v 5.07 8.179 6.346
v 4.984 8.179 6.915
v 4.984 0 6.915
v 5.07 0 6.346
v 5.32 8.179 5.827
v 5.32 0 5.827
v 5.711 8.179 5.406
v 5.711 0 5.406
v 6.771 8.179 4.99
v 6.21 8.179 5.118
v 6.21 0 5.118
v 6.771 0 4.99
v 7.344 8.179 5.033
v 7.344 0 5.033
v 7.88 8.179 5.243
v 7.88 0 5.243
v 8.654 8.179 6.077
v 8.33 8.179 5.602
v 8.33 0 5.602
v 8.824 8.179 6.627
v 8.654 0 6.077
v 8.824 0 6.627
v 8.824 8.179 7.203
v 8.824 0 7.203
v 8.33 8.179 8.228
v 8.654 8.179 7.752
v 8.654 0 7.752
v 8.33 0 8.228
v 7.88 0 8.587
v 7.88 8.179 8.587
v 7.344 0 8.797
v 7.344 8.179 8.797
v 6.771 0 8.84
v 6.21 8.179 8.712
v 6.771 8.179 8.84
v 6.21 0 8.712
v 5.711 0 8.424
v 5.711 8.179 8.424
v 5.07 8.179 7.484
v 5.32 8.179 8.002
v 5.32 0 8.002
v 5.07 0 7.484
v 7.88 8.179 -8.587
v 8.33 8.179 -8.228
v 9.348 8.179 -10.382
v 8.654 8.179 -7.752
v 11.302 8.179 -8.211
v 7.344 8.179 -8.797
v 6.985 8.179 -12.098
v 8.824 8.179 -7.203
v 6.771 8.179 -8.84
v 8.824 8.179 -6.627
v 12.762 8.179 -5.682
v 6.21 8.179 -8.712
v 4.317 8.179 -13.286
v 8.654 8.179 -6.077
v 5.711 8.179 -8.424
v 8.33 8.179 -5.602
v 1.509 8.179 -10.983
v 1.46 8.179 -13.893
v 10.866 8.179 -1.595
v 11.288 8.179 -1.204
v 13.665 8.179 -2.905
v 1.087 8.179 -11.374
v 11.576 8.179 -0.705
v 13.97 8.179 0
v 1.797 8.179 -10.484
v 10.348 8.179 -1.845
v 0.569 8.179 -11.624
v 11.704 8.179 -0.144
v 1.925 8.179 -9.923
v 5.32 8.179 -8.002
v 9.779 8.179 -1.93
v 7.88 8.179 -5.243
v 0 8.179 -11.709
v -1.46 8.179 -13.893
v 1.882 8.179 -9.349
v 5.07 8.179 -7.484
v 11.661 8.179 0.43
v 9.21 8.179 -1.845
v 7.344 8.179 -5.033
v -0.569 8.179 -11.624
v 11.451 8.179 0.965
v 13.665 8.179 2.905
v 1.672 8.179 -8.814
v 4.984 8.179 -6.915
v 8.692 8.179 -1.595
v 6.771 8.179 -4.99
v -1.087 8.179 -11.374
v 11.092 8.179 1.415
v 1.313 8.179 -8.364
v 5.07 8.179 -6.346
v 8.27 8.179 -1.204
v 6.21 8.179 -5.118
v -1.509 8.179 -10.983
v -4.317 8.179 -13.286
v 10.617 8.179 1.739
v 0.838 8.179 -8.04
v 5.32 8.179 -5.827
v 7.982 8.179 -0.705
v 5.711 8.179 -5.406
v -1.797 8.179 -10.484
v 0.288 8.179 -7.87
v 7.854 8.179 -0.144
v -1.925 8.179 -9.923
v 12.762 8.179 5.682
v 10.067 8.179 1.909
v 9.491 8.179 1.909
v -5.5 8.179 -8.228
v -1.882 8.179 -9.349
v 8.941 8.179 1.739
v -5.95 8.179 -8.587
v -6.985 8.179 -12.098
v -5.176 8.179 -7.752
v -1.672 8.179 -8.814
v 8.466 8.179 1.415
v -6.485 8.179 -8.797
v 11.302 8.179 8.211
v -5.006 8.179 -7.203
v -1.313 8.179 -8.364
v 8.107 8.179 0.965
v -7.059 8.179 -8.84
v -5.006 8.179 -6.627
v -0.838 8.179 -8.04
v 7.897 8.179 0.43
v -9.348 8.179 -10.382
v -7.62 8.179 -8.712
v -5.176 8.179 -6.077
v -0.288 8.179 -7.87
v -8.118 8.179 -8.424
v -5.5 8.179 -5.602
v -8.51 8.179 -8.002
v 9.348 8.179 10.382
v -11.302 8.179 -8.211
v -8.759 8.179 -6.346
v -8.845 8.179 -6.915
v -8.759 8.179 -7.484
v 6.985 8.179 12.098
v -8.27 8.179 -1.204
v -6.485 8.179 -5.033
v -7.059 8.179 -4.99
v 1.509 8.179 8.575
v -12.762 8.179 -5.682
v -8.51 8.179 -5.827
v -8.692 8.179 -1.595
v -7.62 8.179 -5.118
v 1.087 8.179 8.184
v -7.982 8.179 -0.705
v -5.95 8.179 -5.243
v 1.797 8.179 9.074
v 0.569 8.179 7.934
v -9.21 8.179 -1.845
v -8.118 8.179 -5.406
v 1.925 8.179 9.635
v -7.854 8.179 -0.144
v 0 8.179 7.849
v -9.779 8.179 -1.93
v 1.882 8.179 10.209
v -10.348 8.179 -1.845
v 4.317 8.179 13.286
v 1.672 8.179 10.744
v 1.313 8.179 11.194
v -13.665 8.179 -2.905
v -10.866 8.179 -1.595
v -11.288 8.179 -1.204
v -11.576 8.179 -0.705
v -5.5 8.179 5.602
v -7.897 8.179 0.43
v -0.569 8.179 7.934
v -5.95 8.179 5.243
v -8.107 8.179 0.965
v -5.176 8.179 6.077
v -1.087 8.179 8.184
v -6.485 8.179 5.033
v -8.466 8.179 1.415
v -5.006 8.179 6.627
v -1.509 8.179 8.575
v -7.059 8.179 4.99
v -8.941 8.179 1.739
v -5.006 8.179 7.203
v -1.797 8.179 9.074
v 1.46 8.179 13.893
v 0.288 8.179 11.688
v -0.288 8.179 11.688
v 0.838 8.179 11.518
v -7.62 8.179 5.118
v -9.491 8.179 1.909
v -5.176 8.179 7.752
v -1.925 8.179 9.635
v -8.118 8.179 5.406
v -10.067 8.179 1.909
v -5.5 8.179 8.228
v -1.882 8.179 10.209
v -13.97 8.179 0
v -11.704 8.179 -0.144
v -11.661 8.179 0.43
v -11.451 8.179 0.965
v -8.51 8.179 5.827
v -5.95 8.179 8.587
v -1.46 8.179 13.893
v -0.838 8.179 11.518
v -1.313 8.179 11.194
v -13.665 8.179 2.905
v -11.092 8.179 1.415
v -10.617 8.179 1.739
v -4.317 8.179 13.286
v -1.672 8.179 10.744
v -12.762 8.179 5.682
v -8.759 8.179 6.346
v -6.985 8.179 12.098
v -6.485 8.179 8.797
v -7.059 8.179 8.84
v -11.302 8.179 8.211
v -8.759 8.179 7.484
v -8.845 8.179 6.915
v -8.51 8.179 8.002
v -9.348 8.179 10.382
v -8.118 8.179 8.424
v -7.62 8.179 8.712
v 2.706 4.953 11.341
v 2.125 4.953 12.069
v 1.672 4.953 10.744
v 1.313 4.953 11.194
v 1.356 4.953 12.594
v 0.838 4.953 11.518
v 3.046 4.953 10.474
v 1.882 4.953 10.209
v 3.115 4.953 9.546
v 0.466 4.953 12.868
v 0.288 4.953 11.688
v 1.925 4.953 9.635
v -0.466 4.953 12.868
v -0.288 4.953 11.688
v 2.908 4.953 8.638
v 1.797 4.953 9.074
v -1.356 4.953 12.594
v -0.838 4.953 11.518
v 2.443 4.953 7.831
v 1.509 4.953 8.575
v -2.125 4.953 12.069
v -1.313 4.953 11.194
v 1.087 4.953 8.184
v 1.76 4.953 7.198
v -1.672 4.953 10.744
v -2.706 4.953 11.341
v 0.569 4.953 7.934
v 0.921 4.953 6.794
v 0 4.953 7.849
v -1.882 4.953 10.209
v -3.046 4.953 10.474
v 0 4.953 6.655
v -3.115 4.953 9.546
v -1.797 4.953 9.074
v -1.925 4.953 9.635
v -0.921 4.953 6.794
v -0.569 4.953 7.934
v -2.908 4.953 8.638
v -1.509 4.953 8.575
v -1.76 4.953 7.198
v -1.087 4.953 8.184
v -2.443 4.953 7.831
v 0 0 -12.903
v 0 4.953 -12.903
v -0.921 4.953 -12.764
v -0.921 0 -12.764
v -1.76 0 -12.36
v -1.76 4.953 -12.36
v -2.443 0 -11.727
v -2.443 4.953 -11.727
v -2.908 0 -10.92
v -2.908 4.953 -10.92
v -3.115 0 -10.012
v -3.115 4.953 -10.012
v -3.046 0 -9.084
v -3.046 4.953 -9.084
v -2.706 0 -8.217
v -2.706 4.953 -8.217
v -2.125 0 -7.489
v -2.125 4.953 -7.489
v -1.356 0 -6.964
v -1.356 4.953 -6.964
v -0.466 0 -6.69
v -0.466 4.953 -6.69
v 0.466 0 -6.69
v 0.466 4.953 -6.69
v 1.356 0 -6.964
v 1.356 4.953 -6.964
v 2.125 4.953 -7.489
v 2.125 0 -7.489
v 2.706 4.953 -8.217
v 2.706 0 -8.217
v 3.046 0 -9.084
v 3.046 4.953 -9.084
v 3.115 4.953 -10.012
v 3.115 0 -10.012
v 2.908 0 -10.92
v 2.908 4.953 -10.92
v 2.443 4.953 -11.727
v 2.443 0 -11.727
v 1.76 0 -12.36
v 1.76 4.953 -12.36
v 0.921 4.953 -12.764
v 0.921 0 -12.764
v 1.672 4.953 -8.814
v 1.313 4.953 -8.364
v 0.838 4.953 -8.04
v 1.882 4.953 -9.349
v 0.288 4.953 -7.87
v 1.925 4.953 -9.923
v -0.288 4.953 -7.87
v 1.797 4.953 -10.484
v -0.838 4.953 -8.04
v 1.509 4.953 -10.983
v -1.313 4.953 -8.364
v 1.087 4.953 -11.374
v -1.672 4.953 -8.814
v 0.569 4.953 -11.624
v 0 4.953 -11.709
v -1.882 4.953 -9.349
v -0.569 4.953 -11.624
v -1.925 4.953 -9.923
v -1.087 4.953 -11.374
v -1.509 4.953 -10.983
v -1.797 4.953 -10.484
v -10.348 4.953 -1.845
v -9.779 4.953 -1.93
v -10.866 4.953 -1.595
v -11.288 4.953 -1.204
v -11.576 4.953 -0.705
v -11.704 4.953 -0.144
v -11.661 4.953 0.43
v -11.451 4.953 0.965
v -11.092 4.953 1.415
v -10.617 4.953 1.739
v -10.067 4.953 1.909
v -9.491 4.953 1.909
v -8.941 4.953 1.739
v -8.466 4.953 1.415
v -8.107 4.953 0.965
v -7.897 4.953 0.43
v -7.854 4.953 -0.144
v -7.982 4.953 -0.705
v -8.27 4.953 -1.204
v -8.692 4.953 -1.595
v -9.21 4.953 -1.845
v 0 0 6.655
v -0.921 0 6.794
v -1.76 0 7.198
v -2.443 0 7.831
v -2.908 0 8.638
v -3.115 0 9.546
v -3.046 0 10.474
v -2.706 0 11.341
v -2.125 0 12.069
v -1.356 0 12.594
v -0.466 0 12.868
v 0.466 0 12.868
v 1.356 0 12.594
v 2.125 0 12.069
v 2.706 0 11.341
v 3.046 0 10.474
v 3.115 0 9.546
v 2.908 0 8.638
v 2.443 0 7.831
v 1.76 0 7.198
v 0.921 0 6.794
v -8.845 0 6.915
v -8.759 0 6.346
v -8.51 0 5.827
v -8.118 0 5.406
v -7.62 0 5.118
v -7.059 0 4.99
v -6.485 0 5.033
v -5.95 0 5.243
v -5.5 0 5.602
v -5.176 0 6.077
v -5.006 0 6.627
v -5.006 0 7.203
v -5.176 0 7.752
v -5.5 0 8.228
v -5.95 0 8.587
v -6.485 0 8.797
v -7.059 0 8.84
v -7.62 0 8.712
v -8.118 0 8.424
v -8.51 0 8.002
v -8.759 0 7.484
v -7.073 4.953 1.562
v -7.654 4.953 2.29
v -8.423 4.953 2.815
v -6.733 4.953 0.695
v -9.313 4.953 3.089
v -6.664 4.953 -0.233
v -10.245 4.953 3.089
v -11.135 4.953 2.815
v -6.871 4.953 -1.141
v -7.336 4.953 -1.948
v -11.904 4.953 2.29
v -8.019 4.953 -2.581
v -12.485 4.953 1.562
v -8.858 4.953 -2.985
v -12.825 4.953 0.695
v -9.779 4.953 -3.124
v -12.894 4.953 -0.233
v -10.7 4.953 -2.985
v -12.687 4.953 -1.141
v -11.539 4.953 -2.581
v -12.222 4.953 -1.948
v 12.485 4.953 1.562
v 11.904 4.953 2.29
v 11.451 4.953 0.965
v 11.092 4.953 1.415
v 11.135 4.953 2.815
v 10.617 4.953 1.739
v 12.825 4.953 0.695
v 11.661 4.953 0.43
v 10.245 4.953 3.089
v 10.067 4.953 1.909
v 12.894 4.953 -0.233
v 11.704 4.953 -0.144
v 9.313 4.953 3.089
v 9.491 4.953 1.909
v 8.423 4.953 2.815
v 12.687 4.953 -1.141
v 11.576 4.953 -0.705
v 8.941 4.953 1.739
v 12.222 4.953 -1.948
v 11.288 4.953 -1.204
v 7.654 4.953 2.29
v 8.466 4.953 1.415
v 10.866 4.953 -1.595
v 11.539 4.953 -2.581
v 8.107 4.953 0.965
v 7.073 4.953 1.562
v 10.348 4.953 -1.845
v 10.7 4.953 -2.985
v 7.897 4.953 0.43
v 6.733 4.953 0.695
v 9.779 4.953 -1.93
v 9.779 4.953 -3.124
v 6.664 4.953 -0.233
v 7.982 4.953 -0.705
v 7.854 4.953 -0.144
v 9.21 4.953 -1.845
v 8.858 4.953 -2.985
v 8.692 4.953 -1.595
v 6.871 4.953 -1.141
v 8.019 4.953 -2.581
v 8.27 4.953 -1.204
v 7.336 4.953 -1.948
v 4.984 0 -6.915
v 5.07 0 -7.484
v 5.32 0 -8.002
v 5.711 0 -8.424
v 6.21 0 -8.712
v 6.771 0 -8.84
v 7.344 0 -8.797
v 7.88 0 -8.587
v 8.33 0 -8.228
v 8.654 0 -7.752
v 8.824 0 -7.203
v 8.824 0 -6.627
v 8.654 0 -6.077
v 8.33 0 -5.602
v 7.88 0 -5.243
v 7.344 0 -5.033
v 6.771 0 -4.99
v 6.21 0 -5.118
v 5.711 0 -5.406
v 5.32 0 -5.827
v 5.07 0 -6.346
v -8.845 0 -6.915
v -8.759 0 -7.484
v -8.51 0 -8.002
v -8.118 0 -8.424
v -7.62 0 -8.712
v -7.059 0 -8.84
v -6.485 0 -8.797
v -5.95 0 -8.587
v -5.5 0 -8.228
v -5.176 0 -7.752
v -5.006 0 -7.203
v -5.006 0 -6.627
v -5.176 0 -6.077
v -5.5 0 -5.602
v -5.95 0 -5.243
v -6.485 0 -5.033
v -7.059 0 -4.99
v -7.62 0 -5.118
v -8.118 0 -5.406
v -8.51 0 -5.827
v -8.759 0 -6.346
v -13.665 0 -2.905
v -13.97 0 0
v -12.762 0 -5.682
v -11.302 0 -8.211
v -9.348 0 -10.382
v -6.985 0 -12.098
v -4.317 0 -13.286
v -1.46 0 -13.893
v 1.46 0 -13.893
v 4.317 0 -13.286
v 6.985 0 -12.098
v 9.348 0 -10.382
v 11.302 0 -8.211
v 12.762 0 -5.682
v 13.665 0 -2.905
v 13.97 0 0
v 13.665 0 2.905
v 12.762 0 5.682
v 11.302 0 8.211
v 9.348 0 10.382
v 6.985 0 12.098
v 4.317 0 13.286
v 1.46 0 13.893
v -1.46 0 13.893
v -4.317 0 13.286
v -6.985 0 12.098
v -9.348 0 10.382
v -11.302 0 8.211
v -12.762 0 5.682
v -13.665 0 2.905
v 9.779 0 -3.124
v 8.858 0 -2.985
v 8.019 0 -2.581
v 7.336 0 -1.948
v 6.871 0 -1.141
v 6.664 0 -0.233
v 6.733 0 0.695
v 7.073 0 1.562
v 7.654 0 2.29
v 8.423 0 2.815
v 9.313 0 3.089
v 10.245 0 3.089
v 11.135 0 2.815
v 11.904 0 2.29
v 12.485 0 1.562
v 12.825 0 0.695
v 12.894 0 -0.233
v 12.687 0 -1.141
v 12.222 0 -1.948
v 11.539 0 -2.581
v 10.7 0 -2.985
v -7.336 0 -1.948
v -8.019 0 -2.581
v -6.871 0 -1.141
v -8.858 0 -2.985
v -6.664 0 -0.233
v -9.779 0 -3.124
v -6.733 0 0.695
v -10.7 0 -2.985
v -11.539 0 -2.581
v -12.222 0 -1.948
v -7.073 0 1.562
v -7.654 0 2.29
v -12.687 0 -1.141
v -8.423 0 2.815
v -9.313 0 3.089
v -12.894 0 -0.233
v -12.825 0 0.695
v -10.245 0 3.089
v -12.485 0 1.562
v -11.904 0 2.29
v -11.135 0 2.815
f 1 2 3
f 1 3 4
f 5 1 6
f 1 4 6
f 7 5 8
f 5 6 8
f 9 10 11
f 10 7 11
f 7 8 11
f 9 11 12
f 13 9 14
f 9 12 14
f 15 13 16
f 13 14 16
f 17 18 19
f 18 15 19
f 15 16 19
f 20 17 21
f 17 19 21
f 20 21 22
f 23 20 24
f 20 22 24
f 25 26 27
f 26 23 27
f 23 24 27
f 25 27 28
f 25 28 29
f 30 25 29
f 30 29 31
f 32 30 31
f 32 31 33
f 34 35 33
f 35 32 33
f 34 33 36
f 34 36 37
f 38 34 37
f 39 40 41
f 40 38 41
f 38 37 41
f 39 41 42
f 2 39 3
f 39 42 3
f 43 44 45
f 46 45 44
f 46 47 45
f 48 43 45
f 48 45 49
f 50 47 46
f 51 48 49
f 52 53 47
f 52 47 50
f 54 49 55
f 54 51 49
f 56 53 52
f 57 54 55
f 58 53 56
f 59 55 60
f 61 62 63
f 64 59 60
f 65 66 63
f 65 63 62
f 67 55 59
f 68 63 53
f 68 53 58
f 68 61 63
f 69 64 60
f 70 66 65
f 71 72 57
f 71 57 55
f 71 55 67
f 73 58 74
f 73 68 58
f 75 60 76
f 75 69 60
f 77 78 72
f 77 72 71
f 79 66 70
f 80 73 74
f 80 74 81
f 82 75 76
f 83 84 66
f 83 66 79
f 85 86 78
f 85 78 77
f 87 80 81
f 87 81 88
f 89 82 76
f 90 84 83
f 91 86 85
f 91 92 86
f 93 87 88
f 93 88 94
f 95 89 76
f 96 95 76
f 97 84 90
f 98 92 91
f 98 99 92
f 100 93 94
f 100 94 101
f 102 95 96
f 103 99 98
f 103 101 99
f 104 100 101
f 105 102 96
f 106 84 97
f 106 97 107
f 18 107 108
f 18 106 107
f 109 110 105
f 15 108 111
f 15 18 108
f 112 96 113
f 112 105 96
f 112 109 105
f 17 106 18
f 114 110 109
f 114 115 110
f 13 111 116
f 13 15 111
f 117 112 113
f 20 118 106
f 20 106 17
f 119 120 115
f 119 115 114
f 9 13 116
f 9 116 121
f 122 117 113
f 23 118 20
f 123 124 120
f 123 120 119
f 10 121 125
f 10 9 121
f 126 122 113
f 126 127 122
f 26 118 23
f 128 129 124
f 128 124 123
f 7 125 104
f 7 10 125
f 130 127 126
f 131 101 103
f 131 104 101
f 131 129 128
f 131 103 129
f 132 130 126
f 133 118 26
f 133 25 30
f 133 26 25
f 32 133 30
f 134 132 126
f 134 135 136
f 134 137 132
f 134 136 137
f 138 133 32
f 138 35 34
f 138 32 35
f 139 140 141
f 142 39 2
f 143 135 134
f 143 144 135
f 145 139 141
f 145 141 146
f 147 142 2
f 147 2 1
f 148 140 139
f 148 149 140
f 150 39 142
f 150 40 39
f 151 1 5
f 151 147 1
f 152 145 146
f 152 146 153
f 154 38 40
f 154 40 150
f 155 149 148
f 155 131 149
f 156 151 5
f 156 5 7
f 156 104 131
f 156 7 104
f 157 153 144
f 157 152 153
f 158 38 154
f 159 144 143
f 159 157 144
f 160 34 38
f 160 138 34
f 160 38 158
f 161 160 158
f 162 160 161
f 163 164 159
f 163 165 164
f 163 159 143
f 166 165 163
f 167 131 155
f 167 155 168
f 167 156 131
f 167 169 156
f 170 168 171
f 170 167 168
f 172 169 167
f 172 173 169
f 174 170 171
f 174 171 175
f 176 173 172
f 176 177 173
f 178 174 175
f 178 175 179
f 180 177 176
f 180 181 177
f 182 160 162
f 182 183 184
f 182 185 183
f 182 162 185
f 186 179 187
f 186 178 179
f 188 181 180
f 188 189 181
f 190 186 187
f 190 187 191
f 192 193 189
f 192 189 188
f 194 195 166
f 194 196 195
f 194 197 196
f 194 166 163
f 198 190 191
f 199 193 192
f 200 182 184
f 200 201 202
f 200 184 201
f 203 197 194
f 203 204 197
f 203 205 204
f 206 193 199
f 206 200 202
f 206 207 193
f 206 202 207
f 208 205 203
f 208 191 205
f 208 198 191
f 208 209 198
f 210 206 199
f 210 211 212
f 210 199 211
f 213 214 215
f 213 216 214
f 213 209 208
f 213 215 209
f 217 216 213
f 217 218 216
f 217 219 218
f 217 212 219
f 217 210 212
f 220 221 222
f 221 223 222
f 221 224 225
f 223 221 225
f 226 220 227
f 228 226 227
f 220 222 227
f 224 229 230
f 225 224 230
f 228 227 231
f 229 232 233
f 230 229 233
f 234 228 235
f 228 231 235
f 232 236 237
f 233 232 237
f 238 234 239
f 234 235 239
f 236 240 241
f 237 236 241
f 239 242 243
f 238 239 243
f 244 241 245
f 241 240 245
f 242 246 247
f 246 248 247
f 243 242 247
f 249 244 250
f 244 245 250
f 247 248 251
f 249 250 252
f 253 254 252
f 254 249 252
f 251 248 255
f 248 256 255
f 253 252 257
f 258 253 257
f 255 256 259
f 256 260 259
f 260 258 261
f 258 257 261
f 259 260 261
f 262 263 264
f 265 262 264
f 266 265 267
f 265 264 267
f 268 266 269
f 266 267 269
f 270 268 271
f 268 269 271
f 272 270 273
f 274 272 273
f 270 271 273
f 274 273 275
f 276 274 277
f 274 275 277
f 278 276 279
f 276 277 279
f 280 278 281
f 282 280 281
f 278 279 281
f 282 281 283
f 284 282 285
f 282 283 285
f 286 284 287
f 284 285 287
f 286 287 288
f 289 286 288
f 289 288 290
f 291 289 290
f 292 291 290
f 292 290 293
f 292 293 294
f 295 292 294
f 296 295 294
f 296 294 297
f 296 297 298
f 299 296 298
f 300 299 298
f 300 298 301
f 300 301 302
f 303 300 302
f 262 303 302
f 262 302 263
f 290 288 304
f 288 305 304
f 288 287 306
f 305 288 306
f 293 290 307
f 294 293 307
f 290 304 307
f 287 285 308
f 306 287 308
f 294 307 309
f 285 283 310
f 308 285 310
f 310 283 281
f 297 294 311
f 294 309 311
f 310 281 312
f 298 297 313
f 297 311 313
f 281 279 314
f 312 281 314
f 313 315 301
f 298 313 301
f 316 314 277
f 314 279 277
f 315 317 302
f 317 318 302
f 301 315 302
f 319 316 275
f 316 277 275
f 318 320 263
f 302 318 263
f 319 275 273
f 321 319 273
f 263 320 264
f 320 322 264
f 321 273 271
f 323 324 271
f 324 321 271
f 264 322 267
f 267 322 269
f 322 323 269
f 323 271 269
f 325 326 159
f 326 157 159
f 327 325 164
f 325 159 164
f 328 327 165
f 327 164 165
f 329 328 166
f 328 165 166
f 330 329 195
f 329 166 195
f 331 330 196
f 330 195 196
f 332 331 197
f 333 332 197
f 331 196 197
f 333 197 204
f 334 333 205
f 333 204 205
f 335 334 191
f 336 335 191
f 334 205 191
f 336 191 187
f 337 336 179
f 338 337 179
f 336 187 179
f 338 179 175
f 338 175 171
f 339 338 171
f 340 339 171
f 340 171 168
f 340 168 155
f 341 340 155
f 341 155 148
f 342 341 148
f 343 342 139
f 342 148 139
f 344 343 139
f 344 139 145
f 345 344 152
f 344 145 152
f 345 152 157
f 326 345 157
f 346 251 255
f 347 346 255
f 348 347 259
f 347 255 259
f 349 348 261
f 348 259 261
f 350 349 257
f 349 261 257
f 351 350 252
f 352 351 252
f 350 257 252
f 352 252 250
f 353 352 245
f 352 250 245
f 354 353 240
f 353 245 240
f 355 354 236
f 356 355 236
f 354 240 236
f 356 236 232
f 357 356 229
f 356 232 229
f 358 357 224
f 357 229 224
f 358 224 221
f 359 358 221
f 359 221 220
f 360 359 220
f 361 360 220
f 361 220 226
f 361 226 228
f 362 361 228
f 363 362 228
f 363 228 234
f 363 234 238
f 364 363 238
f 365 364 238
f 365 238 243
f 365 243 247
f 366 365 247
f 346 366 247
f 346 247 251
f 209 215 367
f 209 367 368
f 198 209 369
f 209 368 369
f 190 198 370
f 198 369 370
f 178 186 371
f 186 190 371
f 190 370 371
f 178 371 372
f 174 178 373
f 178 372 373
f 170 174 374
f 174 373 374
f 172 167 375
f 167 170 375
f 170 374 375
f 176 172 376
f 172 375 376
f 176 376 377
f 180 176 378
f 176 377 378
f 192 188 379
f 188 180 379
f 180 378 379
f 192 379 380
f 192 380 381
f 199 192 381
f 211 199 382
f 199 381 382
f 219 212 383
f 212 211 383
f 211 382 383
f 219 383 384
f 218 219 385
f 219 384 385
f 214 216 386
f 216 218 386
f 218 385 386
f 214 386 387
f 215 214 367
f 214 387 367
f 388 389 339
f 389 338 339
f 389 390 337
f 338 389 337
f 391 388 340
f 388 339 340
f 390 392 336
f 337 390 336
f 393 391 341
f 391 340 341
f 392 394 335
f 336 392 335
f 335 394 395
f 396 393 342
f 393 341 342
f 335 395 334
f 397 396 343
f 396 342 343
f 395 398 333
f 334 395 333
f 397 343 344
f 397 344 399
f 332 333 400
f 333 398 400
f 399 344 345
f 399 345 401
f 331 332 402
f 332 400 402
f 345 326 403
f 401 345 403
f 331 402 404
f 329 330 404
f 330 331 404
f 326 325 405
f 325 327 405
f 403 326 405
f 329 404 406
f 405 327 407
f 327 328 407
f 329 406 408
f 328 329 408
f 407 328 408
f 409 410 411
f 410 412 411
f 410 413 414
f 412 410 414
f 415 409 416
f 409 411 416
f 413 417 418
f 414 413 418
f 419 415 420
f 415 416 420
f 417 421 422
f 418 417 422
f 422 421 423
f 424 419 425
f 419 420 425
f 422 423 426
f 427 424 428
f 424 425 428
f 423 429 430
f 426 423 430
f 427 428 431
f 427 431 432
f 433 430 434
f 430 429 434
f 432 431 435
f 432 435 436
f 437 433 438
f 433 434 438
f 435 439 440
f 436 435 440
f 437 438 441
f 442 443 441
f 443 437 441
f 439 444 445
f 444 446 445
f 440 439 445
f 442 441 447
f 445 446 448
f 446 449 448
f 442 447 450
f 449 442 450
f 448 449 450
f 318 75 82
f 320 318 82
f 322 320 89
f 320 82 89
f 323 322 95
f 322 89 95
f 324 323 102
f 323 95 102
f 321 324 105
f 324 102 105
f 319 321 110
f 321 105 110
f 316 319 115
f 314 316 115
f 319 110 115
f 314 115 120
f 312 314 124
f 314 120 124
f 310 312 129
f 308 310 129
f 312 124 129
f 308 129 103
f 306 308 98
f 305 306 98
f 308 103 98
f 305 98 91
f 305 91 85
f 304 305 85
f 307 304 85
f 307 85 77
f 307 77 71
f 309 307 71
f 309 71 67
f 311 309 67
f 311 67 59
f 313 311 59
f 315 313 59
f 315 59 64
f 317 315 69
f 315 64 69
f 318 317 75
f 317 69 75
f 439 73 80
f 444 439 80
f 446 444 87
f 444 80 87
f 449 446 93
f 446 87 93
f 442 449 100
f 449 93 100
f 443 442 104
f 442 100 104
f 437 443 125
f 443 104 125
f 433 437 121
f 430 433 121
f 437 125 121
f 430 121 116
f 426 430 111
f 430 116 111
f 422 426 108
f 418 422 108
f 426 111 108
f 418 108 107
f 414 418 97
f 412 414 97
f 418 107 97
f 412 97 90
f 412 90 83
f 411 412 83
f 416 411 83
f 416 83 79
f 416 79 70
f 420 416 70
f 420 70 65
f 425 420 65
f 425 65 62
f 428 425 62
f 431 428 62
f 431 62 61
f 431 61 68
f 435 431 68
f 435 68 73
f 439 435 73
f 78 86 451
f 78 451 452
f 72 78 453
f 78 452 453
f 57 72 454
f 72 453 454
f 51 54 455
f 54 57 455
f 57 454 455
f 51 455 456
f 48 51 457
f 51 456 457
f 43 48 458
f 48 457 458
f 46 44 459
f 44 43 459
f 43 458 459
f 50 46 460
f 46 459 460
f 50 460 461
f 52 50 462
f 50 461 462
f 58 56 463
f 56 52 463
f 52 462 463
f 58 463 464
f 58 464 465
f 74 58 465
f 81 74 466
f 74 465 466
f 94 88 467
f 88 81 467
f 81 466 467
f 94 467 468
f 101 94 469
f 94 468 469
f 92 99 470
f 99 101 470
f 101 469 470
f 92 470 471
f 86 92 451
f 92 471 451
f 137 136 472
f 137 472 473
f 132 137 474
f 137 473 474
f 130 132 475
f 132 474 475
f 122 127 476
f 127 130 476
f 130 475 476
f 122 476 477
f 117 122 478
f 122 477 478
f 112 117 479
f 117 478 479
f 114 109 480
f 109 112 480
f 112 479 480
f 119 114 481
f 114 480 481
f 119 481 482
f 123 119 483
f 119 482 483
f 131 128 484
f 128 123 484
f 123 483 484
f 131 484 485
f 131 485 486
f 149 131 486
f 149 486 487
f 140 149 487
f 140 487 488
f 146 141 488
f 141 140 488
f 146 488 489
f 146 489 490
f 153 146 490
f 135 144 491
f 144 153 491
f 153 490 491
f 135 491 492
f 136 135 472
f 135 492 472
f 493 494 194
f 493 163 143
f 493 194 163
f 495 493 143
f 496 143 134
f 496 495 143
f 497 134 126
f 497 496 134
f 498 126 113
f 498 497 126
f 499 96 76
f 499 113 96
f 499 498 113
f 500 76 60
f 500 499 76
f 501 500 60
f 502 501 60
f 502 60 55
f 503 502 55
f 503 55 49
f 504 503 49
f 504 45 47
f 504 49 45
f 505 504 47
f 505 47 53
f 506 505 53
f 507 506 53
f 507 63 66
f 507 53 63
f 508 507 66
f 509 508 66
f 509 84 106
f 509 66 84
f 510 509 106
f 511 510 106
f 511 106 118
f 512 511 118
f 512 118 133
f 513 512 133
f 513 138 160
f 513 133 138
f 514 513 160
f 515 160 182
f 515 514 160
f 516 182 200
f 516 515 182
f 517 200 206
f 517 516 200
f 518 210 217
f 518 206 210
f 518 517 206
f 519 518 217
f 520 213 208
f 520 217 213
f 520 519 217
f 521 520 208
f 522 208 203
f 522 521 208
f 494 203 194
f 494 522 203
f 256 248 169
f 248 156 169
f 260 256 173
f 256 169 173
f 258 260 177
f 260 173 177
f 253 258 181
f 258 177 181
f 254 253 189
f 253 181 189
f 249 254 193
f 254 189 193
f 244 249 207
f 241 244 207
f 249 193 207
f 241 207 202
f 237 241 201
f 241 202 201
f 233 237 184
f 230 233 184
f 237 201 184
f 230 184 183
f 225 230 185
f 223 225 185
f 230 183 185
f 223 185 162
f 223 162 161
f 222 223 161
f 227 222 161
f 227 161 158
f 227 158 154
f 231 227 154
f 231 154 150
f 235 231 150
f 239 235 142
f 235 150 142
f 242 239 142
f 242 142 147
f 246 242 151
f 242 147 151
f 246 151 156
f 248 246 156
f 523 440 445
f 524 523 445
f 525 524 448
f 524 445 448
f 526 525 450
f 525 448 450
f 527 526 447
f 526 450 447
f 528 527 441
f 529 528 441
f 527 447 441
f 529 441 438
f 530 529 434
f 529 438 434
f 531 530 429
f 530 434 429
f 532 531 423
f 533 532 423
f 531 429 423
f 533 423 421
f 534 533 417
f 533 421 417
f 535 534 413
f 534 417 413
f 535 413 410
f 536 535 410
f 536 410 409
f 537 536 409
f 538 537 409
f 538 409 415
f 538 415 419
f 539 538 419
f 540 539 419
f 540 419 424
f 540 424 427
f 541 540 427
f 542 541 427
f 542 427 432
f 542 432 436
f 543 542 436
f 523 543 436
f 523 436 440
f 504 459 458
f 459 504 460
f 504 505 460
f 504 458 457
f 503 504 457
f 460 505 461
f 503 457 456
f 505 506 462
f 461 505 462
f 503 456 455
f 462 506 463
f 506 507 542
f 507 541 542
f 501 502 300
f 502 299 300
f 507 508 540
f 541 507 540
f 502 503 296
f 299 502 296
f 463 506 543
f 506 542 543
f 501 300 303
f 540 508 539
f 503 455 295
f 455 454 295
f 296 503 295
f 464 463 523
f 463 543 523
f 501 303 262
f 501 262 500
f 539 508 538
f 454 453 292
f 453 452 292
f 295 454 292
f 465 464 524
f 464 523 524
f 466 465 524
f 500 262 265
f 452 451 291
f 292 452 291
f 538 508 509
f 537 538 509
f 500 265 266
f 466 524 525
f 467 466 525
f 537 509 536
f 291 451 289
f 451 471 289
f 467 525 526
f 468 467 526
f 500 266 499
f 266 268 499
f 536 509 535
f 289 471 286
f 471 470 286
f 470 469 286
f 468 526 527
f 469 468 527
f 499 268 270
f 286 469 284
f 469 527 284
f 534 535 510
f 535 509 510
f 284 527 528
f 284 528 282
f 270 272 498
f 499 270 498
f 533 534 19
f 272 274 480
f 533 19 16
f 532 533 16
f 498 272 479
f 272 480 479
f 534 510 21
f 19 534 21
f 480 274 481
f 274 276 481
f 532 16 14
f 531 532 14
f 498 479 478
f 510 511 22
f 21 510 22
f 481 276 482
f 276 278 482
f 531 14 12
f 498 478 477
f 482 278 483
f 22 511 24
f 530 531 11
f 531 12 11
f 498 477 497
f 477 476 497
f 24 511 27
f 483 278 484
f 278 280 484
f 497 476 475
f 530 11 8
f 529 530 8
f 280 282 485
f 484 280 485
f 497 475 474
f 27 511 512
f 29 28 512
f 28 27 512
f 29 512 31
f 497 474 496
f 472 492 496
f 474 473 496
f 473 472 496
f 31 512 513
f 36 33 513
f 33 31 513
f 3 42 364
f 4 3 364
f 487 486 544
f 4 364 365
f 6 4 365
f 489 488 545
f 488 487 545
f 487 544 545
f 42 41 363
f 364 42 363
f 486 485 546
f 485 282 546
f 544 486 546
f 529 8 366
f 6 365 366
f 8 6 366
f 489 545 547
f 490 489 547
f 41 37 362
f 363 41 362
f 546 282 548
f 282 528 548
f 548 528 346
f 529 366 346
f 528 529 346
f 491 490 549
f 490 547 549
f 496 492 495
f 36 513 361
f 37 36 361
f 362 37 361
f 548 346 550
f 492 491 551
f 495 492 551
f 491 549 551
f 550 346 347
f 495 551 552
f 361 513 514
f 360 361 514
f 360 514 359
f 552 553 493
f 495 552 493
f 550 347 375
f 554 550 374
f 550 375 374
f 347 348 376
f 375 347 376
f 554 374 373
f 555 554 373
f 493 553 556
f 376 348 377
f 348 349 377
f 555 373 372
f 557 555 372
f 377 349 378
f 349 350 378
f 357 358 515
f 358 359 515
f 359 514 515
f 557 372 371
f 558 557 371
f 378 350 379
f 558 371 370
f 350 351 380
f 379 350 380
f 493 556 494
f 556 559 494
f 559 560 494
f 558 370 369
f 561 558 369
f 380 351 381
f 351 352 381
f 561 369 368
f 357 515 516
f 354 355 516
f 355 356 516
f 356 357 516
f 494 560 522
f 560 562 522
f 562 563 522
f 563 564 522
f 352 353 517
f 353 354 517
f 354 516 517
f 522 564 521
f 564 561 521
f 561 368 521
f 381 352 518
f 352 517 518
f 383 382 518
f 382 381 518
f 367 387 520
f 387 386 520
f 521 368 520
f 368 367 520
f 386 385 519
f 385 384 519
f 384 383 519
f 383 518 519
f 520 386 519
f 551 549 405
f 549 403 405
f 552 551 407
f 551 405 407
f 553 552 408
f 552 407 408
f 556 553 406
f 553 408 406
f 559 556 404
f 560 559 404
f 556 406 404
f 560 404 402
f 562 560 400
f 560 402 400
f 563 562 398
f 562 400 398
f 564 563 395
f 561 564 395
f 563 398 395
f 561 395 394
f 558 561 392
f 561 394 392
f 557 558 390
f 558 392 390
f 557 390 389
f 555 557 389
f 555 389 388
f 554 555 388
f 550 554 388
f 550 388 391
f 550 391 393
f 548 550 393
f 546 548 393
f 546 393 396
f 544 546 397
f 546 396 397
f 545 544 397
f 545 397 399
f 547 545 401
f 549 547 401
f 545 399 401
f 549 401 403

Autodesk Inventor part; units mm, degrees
ref_plane "YZ Plane" through (0, 0, 0) normal (1, 0, 0) x (0, 1, 0)
ref_plane "XZ Plane" through (0, 0, 0) normal (0, 1, 0) x (-1, 0, 0)
ref_plane "XY Plane" through (0, 0, 0) normal (0, 0, 1) x (1, 0, 0)
sketch "Sketch1" plane through (0, 0, 0) normal (0, 1, 0) x (-1, 0, 0)
  circle A0 centre (9.779, 0) radius 1.9304 construction
  circle A1 centre (6.9148, 6.9148) radius 1.9304 construction
  circle A2 centre (0, 9.779) radius 1.9304 construction
  circle A3 centre (-6.9148, 6.9148) radius 1.9304 construction
  circle A4 centre (-9.779, 0) radius 1.9304 construction
  circle A5 centre (-6.9148, -6.9148) radius 1.9304 construction
  circle A6 centre (0, -9.779) radius 1.9304 construction
  circle A7 centre (6.9148, -6.9148) radius 1.9304 construction
  circle A8 centre (9.779, 0) radius 3.1242 construction
  circle A9 centre (0, 9.779) radius 3.1242 construction
  circle A10 centre (-9.779, 0) radius 3.1242 construction
  circle A11 centre (0, -9.779) radius 3.1242 construction
  circle A12 centre (0, 0) radius 13.97
  circle A13 centre (6.9148, -6.9148) radius 1.9304
  circle A14 centre (6.9148, 6.9148) radius 1.9304
  circle A15 centre (-6.9148, 6.9148) radius 1.9304
  circle A16 centre (-6.9148, -6.9148) radius 1.9304
  dimension "d0" = 3.8608
  dimension "d1" = 9.779
  dimension "d4" = 360
  dimension "d6" = 6.2484
  dimension "d9" = 360
  dimension "d11" = 27.94
  dimension "d12" = 3.8608
  dimension "d13" = 3.8608
  dimension "d14" = 3.8608
  dimension "d15" = 3.8608
extrude "Extrusion1" add sketch "Sketch1" along normal blind 8.1788
hole "Hole1" at (0, 0, 9.779) at (9.779, 0, 0) at (0, 0, -9.779) at (-9.779, 0, 0) direction (0, 1, 0) diameter 3.8608 end through all counterbore diameter 6.2484 counterbore depth 4.953
properties part number "Collector rotation xrail to turntable adapter"
